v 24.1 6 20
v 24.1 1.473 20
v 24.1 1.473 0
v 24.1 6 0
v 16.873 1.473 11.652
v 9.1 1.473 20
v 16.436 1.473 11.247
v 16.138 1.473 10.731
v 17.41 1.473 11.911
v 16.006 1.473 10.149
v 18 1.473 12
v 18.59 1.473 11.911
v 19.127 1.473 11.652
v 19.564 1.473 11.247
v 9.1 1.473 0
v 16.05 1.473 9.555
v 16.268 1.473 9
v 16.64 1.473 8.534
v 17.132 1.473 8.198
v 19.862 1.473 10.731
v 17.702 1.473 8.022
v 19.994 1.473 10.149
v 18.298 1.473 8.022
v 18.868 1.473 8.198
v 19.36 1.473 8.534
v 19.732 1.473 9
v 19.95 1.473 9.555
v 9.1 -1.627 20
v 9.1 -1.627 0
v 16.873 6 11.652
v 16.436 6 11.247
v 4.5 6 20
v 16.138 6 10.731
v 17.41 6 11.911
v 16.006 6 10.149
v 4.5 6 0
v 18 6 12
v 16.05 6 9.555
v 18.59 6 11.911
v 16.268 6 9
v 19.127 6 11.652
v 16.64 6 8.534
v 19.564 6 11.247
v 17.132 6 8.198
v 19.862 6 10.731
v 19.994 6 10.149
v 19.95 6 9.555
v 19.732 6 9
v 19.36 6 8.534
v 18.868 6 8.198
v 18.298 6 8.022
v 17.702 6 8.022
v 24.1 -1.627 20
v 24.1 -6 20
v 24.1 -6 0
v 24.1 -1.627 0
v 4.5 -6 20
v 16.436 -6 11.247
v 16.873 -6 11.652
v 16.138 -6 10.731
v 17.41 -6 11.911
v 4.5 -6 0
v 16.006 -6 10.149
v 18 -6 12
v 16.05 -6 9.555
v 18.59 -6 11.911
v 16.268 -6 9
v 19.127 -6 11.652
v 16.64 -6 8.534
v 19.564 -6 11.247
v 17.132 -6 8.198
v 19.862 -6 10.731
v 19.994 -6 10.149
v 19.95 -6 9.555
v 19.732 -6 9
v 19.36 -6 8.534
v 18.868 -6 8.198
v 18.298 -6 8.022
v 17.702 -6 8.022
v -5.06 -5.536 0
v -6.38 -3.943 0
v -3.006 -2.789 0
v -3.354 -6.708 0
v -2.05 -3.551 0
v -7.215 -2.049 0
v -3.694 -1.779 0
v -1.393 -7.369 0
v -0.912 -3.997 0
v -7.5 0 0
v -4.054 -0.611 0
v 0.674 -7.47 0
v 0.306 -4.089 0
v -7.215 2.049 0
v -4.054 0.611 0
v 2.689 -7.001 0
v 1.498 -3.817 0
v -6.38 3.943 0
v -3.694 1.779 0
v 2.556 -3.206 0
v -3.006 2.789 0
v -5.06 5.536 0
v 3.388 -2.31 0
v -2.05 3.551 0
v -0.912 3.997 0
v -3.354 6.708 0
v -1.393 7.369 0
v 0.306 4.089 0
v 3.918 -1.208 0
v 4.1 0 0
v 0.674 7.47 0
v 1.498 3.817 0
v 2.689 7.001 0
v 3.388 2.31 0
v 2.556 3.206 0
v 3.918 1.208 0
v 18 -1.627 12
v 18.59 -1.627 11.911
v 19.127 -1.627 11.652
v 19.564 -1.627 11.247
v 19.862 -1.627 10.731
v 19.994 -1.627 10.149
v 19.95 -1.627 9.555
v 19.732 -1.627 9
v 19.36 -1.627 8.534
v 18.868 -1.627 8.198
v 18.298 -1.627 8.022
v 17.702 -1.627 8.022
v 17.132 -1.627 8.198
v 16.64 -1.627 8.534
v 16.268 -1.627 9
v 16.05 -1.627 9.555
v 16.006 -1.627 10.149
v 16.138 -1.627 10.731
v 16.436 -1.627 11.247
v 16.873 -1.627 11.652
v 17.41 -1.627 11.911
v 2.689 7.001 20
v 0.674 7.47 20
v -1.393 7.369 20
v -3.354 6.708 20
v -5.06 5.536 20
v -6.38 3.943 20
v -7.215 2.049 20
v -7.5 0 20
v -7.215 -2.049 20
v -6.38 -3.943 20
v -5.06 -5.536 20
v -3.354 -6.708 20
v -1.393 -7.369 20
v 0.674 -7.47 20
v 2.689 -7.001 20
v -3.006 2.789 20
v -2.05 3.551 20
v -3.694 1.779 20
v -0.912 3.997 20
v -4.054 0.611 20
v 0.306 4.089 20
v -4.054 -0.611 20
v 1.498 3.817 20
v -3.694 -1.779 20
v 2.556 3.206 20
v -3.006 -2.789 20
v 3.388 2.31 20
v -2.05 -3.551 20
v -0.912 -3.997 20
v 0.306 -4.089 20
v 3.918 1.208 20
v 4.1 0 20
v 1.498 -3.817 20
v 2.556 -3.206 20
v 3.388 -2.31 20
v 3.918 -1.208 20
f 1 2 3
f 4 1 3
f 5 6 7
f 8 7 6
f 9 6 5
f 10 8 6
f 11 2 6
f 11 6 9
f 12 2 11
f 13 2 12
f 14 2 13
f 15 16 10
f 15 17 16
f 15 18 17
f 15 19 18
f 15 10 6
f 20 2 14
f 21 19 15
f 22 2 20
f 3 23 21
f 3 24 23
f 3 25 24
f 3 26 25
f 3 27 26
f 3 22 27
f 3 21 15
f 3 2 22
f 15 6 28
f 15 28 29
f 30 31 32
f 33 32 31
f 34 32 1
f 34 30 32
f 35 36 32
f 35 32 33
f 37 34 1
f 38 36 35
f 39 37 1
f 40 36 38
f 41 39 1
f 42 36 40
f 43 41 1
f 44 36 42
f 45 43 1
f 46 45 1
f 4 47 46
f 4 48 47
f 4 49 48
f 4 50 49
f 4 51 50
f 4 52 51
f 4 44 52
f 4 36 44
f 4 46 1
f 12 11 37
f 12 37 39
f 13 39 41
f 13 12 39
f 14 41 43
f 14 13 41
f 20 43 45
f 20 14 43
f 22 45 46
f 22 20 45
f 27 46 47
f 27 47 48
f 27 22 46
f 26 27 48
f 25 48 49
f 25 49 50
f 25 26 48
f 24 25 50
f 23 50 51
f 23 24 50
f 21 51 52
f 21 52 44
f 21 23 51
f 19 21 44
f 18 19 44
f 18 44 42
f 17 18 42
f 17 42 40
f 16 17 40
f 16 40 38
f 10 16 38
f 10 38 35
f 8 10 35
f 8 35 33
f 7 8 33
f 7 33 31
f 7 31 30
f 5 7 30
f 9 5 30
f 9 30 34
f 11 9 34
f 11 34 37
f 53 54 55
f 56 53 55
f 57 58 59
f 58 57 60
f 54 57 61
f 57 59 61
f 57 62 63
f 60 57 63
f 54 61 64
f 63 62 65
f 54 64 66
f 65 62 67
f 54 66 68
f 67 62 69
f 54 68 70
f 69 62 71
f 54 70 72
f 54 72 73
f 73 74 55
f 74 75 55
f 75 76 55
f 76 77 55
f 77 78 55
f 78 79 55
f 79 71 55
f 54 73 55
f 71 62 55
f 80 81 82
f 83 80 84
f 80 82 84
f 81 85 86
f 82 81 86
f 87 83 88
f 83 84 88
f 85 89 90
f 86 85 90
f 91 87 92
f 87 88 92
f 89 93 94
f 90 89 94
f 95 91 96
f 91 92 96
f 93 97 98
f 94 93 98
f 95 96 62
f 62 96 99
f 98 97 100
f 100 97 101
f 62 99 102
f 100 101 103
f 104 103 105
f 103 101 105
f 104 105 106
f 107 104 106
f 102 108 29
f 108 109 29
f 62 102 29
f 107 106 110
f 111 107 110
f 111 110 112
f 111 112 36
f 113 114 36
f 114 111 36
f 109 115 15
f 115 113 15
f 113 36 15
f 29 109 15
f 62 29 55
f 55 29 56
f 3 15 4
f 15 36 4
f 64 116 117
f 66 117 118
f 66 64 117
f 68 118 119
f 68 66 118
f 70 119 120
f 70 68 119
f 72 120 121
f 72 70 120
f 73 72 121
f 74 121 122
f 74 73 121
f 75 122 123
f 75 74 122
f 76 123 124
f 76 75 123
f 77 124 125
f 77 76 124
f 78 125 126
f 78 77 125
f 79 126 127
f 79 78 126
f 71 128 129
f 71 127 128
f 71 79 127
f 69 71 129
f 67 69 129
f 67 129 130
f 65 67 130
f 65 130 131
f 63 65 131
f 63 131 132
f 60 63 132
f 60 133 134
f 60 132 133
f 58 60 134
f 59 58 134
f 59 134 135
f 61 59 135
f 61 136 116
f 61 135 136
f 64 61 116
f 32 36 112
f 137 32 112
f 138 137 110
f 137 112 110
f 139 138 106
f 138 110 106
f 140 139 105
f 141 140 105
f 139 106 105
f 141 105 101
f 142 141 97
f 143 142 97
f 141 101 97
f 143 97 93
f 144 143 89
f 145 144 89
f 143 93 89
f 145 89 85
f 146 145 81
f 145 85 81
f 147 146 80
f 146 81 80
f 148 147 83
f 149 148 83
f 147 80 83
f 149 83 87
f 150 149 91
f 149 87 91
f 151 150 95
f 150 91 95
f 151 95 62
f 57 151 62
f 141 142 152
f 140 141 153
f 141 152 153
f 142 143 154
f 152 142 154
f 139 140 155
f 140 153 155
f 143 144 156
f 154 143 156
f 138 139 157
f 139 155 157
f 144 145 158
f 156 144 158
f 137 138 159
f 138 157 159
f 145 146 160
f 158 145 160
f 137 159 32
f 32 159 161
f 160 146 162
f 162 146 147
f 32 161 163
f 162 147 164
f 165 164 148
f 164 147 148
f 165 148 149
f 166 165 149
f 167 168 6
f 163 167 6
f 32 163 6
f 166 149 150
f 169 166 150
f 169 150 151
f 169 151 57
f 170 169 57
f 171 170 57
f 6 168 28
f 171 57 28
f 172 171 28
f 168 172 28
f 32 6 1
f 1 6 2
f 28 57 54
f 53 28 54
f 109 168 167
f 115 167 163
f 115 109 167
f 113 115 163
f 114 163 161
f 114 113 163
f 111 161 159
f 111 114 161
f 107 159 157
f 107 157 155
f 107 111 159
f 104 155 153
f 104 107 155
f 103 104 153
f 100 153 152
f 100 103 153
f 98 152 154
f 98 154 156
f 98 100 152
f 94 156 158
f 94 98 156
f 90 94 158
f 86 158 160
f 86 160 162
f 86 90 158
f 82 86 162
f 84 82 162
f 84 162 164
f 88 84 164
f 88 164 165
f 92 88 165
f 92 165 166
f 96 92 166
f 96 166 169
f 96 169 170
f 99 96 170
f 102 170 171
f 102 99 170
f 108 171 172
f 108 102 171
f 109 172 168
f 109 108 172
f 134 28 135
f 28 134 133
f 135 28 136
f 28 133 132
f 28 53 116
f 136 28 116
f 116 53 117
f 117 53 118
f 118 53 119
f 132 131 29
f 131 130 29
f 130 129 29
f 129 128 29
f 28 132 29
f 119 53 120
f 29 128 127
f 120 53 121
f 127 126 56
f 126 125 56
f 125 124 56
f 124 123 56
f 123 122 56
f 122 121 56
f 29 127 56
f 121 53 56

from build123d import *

# Parameters (mm, degrees)
SKETCH_1_R           = 7.5
SKETCH_1_R_2         = 4.1
EXTRUDE_1_DEPTH      = 20
EXTRUDE_2_DEPTH      = 6
EXTRUDE_2_DEPTH_BACK = 6
SKETCH_2_W           = 20
SKETCH_2_H           = 20
SKETCH_2_R           = 2
SKETCH_3_W           = 20
SKETCH_3_H           = 3.1
CUT_EXTRUDE_1_DEPTH  = 15


with BuildPart() as part:
    # 草图1 → 凸台-拉伸1 (new body)
    with BuildSketch(Plane.XY):
        Circle(SKETCH_1_R)
        Circle(SKETCH_1_R_2, mode=Mode.SUBTRACT)
    extrude(amount=EXTRUDE_1_DEPTH)

    # 草图2 → 凸台-拉伸2 (add, two sides: drawn at the far end of the back side and taken through both)
    with BuildSketch(Plane(origin=(0, 0, 0), x_dir=(1, 0, 0), z_dir=(0, 1, 0)).offset(-EXTRUDE_2_DEPTH_BACK)):
        with Locations((14.1, -10)):
            Rectangle(SKETCH_2_W, SKETCH_2_H)
        with Locations((18, -10)):
            Circle(SKETCH_2_R, mode=Mode.SUBTRACT)
    extrude(amount=EXTRUDE_2_DEPTH + EXTRUDE_2_DEPTH_BACK)

    # 草图3 → 切除-拉伸1 (cut)
    with BuildSketch(Plane(origin=(24.1, 0, 0), x_dir=(0, 0, -1), z_dir=(1, 0, 0))):
        with Locations((-10, -0.077105761)):
            Rectangle(SKETCH_3_W, SKETCH_3_H)
    extrude(amount=-CUT_EXTRUDE_1_DEPTH, mode=Mode.SUBTRACT)


solid = part.part
